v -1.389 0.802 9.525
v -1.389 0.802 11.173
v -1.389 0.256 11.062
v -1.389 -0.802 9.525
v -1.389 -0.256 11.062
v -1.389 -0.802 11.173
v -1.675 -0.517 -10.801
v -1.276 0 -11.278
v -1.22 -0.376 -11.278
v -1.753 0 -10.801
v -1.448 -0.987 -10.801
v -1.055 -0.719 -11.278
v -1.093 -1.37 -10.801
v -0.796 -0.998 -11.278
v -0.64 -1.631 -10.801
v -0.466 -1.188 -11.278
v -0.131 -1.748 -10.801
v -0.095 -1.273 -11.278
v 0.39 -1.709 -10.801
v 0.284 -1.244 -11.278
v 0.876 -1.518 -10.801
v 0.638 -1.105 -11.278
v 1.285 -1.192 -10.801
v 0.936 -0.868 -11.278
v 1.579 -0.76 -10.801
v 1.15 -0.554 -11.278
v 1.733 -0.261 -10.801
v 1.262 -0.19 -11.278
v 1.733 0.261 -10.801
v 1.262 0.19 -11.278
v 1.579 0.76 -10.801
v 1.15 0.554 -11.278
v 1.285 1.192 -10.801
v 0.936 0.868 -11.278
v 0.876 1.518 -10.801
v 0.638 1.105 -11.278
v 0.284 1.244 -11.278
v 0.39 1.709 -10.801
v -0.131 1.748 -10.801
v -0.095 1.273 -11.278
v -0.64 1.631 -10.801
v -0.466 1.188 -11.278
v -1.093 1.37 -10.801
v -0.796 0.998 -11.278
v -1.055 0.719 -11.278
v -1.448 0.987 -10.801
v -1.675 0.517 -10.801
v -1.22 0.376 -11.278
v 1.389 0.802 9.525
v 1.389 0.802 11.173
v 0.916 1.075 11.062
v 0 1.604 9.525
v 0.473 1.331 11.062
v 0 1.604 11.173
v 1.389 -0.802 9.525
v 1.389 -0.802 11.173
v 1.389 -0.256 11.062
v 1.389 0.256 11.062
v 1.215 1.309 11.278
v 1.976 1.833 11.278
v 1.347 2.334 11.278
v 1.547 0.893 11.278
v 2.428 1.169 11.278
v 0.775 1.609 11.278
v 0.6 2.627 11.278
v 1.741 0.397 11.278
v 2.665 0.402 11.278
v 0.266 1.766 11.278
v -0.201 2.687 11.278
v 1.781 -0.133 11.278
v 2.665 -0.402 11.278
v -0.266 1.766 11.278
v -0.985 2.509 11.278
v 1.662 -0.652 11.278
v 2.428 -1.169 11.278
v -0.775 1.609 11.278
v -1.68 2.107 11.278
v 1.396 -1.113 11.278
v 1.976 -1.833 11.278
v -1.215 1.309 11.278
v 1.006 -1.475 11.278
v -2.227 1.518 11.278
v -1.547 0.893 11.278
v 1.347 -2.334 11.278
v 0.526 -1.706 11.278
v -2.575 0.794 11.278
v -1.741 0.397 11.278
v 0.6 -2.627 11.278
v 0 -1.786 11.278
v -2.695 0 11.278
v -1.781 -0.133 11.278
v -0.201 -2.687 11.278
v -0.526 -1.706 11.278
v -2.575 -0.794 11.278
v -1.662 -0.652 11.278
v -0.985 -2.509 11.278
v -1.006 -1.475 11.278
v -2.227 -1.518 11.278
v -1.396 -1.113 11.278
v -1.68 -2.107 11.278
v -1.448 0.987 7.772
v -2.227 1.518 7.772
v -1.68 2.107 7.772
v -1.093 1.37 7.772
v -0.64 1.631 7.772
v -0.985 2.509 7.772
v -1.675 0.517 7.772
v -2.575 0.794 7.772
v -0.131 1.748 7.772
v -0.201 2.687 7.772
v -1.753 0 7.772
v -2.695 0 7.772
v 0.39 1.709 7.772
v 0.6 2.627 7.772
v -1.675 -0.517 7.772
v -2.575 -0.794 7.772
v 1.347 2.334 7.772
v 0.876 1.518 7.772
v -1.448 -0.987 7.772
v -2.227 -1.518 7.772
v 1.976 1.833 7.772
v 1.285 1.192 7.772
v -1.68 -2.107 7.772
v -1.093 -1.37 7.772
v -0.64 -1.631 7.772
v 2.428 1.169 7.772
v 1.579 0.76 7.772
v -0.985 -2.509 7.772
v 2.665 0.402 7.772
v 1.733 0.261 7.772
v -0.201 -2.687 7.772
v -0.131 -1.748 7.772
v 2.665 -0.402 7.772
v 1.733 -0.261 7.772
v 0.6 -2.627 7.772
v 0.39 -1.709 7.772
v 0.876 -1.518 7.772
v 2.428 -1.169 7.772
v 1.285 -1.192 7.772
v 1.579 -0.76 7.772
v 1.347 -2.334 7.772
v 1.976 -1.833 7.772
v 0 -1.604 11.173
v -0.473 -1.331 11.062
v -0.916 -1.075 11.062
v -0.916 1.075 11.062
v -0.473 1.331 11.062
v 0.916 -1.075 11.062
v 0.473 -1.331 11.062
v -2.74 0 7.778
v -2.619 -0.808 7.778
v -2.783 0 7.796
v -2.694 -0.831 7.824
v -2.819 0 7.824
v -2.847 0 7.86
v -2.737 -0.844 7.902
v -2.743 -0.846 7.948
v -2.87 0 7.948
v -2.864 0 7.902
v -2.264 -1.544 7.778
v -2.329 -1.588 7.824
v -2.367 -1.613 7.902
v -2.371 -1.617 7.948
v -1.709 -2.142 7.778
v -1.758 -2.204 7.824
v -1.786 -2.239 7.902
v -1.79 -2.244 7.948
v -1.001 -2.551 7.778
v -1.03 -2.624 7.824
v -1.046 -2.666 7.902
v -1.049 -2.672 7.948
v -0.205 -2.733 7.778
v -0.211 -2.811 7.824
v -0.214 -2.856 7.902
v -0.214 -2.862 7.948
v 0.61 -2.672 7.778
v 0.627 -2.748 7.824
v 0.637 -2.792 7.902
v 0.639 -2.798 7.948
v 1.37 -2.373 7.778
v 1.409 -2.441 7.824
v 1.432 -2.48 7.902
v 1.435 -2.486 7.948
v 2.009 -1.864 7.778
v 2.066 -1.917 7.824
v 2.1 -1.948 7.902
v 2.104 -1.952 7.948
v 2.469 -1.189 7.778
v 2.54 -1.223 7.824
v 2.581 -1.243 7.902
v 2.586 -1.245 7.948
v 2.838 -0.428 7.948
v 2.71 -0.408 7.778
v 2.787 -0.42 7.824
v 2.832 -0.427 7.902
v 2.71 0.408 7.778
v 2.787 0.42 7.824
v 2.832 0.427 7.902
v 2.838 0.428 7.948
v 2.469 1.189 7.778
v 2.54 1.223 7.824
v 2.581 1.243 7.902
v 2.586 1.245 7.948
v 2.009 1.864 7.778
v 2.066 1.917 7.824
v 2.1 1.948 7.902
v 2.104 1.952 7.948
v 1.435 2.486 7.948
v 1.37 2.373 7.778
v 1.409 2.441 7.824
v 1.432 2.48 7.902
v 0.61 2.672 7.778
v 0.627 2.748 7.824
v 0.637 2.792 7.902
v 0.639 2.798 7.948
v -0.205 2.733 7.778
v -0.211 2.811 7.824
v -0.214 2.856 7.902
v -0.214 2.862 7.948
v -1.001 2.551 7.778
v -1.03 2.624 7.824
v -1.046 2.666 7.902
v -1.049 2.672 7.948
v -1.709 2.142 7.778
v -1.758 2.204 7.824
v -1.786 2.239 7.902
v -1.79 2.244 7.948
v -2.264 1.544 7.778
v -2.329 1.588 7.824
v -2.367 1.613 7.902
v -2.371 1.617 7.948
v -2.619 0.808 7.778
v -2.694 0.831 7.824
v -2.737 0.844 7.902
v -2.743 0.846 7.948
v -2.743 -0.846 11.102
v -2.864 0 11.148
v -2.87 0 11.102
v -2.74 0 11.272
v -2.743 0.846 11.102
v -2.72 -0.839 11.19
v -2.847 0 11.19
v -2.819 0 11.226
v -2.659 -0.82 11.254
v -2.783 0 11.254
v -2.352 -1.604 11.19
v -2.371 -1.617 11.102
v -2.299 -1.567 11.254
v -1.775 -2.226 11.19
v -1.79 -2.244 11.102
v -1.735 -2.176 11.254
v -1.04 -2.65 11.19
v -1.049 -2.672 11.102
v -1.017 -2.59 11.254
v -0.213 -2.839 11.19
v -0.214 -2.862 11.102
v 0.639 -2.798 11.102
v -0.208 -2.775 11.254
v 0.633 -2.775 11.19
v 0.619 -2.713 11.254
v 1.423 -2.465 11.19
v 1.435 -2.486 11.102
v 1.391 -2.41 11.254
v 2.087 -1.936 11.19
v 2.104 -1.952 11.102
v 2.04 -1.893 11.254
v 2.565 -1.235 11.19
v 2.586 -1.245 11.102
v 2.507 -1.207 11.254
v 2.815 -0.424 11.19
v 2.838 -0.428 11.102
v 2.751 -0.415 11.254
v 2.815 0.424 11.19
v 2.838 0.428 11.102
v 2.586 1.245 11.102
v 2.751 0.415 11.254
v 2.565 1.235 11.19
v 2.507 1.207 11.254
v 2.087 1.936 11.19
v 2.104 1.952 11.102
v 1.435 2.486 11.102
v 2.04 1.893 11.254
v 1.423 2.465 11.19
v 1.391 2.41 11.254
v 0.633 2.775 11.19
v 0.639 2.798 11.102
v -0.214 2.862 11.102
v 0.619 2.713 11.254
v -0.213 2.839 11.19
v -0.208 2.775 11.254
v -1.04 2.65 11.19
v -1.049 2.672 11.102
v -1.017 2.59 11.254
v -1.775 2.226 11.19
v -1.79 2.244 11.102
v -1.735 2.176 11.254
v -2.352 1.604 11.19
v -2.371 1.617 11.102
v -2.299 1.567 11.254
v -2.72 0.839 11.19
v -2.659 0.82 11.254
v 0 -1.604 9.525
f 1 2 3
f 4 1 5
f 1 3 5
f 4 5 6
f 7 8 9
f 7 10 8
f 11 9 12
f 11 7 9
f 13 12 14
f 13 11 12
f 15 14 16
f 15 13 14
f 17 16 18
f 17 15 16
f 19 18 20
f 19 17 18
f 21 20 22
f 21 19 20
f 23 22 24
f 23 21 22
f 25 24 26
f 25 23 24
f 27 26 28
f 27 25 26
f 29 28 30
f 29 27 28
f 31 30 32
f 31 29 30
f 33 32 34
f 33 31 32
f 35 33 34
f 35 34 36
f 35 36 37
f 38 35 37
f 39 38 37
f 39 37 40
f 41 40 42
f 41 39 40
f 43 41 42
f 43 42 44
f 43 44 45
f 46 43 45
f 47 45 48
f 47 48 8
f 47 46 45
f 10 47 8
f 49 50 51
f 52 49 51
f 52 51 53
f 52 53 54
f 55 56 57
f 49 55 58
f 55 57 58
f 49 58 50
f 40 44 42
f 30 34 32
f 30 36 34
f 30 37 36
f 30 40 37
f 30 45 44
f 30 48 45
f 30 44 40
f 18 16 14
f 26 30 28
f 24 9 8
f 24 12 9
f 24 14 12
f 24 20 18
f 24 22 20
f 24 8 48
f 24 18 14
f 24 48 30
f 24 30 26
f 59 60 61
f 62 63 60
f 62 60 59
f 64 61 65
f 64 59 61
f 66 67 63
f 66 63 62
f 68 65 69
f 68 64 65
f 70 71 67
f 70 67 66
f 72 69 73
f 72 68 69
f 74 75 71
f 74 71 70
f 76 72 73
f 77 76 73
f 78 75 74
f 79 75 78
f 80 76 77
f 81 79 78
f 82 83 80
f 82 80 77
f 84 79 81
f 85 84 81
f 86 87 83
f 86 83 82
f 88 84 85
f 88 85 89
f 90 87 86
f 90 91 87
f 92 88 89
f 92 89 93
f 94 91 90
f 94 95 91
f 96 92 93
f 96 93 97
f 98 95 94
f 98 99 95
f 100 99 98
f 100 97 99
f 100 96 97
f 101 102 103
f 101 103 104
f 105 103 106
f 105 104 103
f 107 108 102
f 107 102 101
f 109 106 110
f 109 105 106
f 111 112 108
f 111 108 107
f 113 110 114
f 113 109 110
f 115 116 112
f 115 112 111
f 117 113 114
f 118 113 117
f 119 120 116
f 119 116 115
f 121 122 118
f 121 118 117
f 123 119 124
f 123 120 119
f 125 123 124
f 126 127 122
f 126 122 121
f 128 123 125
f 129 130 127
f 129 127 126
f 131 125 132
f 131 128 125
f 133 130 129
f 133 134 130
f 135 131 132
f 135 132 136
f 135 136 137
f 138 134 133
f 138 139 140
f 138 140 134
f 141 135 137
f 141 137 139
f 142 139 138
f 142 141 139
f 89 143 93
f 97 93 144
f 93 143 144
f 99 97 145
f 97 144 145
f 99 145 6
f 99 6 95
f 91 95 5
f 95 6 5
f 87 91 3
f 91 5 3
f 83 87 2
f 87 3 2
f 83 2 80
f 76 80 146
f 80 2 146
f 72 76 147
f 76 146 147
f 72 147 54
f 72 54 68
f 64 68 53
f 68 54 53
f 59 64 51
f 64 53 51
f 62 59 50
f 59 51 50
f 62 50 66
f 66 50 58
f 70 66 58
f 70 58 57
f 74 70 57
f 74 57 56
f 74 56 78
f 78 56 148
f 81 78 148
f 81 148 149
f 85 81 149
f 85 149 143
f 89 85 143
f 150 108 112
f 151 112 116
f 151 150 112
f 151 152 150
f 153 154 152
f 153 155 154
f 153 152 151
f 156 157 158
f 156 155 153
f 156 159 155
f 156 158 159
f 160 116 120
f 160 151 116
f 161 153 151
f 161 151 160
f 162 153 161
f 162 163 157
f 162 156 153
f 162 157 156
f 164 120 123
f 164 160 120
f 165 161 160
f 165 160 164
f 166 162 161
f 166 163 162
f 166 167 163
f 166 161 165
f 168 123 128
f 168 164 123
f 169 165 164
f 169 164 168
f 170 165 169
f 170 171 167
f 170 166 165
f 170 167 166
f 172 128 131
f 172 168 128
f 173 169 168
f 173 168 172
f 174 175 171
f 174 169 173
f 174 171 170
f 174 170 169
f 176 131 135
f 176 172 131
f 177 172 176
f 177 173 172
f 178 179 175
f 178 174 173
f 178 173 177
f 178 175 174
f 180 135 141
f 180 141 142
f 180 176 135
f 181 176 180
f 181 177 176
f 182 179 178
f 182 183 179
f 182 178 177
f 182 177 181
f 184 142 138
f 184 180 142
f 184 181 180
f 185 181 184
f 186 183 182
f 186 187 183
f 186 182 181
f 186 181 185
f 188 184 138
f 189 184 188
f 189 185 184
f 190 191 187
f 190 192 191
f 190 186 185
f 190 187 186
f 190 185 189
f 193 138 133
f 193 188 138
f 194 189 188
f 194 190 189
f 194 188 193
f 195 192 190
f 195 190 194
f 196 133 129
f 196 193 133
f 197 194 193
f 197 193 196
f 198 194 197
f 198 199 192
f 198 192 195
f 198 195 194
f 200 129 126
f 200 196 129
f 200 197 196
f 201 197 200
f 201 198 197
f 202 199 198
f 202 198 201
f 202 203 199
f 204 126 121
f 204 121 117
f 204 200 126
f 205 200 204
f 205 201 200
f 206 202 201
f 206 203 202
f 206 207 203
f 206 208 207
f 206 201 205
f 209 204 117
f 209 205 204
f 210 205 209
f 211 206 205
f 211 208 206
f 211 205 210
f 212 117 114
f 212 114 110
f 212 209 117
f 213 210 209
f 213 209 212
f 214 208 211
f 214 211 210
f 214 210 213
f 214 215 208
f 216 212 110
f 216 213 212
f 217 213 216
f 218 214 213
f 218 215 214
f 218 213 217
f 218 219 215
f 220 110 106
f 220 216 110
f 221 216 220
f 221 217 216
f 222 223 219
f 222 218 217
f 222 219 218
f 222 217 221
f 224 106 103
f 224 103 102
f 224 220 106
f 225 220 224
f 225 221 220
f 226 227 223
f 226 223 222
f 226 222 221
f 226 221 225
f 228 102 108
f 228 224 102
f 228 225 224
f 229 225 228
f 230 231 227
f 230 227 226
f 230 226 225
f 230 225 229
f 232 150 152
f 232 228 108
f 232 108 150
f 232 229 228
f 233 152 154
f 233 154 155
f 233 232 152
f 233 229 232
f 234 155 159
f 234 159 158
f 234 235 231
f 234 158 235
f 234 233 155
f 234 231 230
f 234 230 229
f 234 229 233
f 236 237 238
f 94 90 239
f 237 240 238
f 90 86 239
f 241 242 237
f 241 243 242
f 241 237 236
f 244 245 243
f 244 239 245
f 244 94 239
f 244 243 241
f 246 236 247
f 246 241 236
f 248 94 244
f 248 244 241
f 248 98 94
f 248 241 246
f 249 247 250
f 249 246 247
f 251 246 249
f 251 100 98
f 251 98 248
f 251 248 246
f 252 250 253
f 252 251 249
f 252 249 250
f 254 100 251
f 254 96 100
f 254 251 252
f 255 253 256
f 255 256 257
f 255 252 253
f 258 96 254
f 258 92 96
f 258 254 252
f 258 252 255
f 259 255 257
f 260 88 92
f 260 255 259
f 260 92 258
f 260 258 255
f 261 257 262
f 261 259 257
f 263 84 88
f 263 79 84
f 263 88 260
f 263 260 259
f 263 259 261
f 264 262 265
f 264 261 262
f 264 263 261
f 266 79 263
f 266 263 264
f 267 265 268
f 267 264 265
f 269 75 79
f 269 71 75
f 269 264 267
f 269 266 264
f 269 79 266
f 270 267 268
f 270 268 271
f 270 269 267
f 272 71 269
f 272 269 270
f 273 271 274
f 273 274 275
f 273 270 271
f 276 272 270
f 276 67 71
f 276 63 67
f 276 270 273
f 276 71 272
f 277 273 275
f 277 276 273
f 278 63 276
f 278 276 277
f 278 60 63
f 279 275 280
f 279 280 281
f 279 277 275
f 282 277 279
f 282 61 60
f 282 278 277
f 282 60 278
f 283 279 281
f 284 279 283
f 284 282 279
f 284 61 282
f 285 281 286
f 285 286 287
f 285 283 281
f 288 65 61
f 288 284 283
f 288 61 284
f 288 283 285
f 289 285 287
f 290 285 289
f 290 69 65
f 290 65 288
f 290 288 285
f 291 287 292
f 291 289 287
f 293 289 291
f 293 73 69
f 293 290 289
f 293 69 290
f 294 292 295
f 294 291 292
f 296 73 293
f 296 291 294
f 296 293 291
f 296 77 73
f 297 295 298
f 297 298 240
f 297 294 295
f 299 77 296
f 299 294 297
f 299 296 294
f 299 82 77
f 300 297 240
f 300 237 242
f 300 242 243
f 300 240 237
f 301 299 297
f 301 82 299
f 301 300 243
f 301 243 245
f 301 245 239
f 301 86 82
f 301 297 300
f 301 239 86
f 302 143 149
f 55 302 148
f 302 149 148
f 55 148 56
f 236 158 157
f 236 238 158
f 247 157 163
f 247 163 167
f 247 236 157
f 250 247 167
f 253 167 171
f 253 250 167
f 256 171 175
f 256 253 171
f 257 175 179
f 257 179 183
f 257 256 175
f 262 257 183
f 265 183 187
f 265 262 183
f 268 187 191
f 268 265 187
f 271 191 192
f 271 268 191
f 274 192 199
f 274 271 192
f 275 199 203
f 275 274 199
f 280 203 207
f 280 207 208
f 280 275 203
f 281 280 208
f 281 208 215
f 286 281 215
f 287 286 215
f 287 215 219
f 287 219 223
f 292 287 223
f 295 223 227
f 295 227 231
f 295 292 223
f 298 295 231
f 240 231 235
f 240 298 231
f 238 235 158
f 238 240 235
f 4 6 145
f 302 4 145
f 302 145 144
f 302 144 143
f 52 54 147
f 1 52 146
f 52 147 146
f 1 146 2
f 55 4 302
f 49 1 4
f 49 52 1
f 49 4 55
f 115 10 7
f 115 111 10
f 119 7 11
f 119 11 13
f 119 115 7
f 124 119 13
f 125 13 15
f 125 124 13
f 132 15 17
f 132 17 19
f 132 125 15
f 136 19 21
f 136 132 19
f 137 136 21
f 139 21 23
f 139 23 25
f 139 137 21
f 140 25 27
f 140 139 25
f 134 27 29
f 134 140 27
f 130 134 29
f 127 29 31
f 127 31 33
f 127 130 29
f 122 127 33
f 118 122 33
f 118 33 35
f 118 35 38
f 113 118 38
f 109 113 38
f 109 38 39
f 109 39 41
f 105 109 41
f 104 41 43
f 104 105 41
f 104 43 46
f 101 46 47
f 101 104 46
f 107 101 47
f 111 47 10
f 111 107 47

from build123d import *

# Parameters (mm, degrees)
CUT_EXTRUDE1_START = 11.2776
CUT_EXTRUDE1_DEPTH = 1.7526


with BuildPart() as part:
    # Sketch2 → Revolve1 (revolve)
    with BuildSketch(Plane(origin=(0, 0, 0), x_dir=(0, 0, -1), z_dir=(1, 0, 0)), mode=Mode.PRIVATE) as revolve1_sk:
        with BuildLine():
            Line((11.2776, 0), (11.2776, 1.27635))
            Line((11.2776, 1.27635), (10.80135, 1.7526))
            Line((10.80135, 1.7526), (-7.7724, 1.7526))
            Line((-7.7724, 1.7526), (-7.7724, 2.69494))
            ThreePointArc((-7.7724, 2.69494), (-7.823732466, 2.818867534), (-7.94766, 2.8702))
            Line((-7.94766, 2.8702), (-11.10234, 2.8702))
            ThreePointArc((-11.10234, 2.8702), (-11.226267534, 2.818867534), (-11.2776, 2.69494))
            Line((-11.2776, 2.69494), (-11.2776, 0))
            Line((-11.2776, 0), (11.2776, 0))
        make_face()
    revolve(revolve1_sk.sketch.rotate(Axis((0, 0, -11.2776), (0, 0, 1)), 90), axis=Axis((0, 0, -11.2776), (0, 0, 1)))

    # Sketch3 → Cut-Extrude1 (cut)
    with BuildSketch(Plane.XY.offset(CUT_EXTRUDE1_START)):
        Polygon((-1.3890625, 0.801975608), (-1.3890625, -0.801975608), (0, -1.603951217), (1.3890625, -0.801975608), (1.3890625, 0.801975608), (0, 1.603951217), align=None)
    extrude(amount=-CUT_EXTRUDE1_DEPTH, mode=Mode.SUBTRACT)

    # Cut-Extrude2 cone 1 section (through the dimple's axis) → Cut-Extrude2 (revolve, cut)
    with BuildSketch(Plane(origin=(0, 0, 11.2776), x_dir=(0, -1, 0), z_dir=(1, 0, 0))):
        Polygon((0, 0), (1.78578268, 0), (0, 1.031022111), align=None)
    revolve(axis=Axis((0, 0, 11.2776), (0, 0, -1)), mode=Mode.SUBTRACT)


solid = part.part
